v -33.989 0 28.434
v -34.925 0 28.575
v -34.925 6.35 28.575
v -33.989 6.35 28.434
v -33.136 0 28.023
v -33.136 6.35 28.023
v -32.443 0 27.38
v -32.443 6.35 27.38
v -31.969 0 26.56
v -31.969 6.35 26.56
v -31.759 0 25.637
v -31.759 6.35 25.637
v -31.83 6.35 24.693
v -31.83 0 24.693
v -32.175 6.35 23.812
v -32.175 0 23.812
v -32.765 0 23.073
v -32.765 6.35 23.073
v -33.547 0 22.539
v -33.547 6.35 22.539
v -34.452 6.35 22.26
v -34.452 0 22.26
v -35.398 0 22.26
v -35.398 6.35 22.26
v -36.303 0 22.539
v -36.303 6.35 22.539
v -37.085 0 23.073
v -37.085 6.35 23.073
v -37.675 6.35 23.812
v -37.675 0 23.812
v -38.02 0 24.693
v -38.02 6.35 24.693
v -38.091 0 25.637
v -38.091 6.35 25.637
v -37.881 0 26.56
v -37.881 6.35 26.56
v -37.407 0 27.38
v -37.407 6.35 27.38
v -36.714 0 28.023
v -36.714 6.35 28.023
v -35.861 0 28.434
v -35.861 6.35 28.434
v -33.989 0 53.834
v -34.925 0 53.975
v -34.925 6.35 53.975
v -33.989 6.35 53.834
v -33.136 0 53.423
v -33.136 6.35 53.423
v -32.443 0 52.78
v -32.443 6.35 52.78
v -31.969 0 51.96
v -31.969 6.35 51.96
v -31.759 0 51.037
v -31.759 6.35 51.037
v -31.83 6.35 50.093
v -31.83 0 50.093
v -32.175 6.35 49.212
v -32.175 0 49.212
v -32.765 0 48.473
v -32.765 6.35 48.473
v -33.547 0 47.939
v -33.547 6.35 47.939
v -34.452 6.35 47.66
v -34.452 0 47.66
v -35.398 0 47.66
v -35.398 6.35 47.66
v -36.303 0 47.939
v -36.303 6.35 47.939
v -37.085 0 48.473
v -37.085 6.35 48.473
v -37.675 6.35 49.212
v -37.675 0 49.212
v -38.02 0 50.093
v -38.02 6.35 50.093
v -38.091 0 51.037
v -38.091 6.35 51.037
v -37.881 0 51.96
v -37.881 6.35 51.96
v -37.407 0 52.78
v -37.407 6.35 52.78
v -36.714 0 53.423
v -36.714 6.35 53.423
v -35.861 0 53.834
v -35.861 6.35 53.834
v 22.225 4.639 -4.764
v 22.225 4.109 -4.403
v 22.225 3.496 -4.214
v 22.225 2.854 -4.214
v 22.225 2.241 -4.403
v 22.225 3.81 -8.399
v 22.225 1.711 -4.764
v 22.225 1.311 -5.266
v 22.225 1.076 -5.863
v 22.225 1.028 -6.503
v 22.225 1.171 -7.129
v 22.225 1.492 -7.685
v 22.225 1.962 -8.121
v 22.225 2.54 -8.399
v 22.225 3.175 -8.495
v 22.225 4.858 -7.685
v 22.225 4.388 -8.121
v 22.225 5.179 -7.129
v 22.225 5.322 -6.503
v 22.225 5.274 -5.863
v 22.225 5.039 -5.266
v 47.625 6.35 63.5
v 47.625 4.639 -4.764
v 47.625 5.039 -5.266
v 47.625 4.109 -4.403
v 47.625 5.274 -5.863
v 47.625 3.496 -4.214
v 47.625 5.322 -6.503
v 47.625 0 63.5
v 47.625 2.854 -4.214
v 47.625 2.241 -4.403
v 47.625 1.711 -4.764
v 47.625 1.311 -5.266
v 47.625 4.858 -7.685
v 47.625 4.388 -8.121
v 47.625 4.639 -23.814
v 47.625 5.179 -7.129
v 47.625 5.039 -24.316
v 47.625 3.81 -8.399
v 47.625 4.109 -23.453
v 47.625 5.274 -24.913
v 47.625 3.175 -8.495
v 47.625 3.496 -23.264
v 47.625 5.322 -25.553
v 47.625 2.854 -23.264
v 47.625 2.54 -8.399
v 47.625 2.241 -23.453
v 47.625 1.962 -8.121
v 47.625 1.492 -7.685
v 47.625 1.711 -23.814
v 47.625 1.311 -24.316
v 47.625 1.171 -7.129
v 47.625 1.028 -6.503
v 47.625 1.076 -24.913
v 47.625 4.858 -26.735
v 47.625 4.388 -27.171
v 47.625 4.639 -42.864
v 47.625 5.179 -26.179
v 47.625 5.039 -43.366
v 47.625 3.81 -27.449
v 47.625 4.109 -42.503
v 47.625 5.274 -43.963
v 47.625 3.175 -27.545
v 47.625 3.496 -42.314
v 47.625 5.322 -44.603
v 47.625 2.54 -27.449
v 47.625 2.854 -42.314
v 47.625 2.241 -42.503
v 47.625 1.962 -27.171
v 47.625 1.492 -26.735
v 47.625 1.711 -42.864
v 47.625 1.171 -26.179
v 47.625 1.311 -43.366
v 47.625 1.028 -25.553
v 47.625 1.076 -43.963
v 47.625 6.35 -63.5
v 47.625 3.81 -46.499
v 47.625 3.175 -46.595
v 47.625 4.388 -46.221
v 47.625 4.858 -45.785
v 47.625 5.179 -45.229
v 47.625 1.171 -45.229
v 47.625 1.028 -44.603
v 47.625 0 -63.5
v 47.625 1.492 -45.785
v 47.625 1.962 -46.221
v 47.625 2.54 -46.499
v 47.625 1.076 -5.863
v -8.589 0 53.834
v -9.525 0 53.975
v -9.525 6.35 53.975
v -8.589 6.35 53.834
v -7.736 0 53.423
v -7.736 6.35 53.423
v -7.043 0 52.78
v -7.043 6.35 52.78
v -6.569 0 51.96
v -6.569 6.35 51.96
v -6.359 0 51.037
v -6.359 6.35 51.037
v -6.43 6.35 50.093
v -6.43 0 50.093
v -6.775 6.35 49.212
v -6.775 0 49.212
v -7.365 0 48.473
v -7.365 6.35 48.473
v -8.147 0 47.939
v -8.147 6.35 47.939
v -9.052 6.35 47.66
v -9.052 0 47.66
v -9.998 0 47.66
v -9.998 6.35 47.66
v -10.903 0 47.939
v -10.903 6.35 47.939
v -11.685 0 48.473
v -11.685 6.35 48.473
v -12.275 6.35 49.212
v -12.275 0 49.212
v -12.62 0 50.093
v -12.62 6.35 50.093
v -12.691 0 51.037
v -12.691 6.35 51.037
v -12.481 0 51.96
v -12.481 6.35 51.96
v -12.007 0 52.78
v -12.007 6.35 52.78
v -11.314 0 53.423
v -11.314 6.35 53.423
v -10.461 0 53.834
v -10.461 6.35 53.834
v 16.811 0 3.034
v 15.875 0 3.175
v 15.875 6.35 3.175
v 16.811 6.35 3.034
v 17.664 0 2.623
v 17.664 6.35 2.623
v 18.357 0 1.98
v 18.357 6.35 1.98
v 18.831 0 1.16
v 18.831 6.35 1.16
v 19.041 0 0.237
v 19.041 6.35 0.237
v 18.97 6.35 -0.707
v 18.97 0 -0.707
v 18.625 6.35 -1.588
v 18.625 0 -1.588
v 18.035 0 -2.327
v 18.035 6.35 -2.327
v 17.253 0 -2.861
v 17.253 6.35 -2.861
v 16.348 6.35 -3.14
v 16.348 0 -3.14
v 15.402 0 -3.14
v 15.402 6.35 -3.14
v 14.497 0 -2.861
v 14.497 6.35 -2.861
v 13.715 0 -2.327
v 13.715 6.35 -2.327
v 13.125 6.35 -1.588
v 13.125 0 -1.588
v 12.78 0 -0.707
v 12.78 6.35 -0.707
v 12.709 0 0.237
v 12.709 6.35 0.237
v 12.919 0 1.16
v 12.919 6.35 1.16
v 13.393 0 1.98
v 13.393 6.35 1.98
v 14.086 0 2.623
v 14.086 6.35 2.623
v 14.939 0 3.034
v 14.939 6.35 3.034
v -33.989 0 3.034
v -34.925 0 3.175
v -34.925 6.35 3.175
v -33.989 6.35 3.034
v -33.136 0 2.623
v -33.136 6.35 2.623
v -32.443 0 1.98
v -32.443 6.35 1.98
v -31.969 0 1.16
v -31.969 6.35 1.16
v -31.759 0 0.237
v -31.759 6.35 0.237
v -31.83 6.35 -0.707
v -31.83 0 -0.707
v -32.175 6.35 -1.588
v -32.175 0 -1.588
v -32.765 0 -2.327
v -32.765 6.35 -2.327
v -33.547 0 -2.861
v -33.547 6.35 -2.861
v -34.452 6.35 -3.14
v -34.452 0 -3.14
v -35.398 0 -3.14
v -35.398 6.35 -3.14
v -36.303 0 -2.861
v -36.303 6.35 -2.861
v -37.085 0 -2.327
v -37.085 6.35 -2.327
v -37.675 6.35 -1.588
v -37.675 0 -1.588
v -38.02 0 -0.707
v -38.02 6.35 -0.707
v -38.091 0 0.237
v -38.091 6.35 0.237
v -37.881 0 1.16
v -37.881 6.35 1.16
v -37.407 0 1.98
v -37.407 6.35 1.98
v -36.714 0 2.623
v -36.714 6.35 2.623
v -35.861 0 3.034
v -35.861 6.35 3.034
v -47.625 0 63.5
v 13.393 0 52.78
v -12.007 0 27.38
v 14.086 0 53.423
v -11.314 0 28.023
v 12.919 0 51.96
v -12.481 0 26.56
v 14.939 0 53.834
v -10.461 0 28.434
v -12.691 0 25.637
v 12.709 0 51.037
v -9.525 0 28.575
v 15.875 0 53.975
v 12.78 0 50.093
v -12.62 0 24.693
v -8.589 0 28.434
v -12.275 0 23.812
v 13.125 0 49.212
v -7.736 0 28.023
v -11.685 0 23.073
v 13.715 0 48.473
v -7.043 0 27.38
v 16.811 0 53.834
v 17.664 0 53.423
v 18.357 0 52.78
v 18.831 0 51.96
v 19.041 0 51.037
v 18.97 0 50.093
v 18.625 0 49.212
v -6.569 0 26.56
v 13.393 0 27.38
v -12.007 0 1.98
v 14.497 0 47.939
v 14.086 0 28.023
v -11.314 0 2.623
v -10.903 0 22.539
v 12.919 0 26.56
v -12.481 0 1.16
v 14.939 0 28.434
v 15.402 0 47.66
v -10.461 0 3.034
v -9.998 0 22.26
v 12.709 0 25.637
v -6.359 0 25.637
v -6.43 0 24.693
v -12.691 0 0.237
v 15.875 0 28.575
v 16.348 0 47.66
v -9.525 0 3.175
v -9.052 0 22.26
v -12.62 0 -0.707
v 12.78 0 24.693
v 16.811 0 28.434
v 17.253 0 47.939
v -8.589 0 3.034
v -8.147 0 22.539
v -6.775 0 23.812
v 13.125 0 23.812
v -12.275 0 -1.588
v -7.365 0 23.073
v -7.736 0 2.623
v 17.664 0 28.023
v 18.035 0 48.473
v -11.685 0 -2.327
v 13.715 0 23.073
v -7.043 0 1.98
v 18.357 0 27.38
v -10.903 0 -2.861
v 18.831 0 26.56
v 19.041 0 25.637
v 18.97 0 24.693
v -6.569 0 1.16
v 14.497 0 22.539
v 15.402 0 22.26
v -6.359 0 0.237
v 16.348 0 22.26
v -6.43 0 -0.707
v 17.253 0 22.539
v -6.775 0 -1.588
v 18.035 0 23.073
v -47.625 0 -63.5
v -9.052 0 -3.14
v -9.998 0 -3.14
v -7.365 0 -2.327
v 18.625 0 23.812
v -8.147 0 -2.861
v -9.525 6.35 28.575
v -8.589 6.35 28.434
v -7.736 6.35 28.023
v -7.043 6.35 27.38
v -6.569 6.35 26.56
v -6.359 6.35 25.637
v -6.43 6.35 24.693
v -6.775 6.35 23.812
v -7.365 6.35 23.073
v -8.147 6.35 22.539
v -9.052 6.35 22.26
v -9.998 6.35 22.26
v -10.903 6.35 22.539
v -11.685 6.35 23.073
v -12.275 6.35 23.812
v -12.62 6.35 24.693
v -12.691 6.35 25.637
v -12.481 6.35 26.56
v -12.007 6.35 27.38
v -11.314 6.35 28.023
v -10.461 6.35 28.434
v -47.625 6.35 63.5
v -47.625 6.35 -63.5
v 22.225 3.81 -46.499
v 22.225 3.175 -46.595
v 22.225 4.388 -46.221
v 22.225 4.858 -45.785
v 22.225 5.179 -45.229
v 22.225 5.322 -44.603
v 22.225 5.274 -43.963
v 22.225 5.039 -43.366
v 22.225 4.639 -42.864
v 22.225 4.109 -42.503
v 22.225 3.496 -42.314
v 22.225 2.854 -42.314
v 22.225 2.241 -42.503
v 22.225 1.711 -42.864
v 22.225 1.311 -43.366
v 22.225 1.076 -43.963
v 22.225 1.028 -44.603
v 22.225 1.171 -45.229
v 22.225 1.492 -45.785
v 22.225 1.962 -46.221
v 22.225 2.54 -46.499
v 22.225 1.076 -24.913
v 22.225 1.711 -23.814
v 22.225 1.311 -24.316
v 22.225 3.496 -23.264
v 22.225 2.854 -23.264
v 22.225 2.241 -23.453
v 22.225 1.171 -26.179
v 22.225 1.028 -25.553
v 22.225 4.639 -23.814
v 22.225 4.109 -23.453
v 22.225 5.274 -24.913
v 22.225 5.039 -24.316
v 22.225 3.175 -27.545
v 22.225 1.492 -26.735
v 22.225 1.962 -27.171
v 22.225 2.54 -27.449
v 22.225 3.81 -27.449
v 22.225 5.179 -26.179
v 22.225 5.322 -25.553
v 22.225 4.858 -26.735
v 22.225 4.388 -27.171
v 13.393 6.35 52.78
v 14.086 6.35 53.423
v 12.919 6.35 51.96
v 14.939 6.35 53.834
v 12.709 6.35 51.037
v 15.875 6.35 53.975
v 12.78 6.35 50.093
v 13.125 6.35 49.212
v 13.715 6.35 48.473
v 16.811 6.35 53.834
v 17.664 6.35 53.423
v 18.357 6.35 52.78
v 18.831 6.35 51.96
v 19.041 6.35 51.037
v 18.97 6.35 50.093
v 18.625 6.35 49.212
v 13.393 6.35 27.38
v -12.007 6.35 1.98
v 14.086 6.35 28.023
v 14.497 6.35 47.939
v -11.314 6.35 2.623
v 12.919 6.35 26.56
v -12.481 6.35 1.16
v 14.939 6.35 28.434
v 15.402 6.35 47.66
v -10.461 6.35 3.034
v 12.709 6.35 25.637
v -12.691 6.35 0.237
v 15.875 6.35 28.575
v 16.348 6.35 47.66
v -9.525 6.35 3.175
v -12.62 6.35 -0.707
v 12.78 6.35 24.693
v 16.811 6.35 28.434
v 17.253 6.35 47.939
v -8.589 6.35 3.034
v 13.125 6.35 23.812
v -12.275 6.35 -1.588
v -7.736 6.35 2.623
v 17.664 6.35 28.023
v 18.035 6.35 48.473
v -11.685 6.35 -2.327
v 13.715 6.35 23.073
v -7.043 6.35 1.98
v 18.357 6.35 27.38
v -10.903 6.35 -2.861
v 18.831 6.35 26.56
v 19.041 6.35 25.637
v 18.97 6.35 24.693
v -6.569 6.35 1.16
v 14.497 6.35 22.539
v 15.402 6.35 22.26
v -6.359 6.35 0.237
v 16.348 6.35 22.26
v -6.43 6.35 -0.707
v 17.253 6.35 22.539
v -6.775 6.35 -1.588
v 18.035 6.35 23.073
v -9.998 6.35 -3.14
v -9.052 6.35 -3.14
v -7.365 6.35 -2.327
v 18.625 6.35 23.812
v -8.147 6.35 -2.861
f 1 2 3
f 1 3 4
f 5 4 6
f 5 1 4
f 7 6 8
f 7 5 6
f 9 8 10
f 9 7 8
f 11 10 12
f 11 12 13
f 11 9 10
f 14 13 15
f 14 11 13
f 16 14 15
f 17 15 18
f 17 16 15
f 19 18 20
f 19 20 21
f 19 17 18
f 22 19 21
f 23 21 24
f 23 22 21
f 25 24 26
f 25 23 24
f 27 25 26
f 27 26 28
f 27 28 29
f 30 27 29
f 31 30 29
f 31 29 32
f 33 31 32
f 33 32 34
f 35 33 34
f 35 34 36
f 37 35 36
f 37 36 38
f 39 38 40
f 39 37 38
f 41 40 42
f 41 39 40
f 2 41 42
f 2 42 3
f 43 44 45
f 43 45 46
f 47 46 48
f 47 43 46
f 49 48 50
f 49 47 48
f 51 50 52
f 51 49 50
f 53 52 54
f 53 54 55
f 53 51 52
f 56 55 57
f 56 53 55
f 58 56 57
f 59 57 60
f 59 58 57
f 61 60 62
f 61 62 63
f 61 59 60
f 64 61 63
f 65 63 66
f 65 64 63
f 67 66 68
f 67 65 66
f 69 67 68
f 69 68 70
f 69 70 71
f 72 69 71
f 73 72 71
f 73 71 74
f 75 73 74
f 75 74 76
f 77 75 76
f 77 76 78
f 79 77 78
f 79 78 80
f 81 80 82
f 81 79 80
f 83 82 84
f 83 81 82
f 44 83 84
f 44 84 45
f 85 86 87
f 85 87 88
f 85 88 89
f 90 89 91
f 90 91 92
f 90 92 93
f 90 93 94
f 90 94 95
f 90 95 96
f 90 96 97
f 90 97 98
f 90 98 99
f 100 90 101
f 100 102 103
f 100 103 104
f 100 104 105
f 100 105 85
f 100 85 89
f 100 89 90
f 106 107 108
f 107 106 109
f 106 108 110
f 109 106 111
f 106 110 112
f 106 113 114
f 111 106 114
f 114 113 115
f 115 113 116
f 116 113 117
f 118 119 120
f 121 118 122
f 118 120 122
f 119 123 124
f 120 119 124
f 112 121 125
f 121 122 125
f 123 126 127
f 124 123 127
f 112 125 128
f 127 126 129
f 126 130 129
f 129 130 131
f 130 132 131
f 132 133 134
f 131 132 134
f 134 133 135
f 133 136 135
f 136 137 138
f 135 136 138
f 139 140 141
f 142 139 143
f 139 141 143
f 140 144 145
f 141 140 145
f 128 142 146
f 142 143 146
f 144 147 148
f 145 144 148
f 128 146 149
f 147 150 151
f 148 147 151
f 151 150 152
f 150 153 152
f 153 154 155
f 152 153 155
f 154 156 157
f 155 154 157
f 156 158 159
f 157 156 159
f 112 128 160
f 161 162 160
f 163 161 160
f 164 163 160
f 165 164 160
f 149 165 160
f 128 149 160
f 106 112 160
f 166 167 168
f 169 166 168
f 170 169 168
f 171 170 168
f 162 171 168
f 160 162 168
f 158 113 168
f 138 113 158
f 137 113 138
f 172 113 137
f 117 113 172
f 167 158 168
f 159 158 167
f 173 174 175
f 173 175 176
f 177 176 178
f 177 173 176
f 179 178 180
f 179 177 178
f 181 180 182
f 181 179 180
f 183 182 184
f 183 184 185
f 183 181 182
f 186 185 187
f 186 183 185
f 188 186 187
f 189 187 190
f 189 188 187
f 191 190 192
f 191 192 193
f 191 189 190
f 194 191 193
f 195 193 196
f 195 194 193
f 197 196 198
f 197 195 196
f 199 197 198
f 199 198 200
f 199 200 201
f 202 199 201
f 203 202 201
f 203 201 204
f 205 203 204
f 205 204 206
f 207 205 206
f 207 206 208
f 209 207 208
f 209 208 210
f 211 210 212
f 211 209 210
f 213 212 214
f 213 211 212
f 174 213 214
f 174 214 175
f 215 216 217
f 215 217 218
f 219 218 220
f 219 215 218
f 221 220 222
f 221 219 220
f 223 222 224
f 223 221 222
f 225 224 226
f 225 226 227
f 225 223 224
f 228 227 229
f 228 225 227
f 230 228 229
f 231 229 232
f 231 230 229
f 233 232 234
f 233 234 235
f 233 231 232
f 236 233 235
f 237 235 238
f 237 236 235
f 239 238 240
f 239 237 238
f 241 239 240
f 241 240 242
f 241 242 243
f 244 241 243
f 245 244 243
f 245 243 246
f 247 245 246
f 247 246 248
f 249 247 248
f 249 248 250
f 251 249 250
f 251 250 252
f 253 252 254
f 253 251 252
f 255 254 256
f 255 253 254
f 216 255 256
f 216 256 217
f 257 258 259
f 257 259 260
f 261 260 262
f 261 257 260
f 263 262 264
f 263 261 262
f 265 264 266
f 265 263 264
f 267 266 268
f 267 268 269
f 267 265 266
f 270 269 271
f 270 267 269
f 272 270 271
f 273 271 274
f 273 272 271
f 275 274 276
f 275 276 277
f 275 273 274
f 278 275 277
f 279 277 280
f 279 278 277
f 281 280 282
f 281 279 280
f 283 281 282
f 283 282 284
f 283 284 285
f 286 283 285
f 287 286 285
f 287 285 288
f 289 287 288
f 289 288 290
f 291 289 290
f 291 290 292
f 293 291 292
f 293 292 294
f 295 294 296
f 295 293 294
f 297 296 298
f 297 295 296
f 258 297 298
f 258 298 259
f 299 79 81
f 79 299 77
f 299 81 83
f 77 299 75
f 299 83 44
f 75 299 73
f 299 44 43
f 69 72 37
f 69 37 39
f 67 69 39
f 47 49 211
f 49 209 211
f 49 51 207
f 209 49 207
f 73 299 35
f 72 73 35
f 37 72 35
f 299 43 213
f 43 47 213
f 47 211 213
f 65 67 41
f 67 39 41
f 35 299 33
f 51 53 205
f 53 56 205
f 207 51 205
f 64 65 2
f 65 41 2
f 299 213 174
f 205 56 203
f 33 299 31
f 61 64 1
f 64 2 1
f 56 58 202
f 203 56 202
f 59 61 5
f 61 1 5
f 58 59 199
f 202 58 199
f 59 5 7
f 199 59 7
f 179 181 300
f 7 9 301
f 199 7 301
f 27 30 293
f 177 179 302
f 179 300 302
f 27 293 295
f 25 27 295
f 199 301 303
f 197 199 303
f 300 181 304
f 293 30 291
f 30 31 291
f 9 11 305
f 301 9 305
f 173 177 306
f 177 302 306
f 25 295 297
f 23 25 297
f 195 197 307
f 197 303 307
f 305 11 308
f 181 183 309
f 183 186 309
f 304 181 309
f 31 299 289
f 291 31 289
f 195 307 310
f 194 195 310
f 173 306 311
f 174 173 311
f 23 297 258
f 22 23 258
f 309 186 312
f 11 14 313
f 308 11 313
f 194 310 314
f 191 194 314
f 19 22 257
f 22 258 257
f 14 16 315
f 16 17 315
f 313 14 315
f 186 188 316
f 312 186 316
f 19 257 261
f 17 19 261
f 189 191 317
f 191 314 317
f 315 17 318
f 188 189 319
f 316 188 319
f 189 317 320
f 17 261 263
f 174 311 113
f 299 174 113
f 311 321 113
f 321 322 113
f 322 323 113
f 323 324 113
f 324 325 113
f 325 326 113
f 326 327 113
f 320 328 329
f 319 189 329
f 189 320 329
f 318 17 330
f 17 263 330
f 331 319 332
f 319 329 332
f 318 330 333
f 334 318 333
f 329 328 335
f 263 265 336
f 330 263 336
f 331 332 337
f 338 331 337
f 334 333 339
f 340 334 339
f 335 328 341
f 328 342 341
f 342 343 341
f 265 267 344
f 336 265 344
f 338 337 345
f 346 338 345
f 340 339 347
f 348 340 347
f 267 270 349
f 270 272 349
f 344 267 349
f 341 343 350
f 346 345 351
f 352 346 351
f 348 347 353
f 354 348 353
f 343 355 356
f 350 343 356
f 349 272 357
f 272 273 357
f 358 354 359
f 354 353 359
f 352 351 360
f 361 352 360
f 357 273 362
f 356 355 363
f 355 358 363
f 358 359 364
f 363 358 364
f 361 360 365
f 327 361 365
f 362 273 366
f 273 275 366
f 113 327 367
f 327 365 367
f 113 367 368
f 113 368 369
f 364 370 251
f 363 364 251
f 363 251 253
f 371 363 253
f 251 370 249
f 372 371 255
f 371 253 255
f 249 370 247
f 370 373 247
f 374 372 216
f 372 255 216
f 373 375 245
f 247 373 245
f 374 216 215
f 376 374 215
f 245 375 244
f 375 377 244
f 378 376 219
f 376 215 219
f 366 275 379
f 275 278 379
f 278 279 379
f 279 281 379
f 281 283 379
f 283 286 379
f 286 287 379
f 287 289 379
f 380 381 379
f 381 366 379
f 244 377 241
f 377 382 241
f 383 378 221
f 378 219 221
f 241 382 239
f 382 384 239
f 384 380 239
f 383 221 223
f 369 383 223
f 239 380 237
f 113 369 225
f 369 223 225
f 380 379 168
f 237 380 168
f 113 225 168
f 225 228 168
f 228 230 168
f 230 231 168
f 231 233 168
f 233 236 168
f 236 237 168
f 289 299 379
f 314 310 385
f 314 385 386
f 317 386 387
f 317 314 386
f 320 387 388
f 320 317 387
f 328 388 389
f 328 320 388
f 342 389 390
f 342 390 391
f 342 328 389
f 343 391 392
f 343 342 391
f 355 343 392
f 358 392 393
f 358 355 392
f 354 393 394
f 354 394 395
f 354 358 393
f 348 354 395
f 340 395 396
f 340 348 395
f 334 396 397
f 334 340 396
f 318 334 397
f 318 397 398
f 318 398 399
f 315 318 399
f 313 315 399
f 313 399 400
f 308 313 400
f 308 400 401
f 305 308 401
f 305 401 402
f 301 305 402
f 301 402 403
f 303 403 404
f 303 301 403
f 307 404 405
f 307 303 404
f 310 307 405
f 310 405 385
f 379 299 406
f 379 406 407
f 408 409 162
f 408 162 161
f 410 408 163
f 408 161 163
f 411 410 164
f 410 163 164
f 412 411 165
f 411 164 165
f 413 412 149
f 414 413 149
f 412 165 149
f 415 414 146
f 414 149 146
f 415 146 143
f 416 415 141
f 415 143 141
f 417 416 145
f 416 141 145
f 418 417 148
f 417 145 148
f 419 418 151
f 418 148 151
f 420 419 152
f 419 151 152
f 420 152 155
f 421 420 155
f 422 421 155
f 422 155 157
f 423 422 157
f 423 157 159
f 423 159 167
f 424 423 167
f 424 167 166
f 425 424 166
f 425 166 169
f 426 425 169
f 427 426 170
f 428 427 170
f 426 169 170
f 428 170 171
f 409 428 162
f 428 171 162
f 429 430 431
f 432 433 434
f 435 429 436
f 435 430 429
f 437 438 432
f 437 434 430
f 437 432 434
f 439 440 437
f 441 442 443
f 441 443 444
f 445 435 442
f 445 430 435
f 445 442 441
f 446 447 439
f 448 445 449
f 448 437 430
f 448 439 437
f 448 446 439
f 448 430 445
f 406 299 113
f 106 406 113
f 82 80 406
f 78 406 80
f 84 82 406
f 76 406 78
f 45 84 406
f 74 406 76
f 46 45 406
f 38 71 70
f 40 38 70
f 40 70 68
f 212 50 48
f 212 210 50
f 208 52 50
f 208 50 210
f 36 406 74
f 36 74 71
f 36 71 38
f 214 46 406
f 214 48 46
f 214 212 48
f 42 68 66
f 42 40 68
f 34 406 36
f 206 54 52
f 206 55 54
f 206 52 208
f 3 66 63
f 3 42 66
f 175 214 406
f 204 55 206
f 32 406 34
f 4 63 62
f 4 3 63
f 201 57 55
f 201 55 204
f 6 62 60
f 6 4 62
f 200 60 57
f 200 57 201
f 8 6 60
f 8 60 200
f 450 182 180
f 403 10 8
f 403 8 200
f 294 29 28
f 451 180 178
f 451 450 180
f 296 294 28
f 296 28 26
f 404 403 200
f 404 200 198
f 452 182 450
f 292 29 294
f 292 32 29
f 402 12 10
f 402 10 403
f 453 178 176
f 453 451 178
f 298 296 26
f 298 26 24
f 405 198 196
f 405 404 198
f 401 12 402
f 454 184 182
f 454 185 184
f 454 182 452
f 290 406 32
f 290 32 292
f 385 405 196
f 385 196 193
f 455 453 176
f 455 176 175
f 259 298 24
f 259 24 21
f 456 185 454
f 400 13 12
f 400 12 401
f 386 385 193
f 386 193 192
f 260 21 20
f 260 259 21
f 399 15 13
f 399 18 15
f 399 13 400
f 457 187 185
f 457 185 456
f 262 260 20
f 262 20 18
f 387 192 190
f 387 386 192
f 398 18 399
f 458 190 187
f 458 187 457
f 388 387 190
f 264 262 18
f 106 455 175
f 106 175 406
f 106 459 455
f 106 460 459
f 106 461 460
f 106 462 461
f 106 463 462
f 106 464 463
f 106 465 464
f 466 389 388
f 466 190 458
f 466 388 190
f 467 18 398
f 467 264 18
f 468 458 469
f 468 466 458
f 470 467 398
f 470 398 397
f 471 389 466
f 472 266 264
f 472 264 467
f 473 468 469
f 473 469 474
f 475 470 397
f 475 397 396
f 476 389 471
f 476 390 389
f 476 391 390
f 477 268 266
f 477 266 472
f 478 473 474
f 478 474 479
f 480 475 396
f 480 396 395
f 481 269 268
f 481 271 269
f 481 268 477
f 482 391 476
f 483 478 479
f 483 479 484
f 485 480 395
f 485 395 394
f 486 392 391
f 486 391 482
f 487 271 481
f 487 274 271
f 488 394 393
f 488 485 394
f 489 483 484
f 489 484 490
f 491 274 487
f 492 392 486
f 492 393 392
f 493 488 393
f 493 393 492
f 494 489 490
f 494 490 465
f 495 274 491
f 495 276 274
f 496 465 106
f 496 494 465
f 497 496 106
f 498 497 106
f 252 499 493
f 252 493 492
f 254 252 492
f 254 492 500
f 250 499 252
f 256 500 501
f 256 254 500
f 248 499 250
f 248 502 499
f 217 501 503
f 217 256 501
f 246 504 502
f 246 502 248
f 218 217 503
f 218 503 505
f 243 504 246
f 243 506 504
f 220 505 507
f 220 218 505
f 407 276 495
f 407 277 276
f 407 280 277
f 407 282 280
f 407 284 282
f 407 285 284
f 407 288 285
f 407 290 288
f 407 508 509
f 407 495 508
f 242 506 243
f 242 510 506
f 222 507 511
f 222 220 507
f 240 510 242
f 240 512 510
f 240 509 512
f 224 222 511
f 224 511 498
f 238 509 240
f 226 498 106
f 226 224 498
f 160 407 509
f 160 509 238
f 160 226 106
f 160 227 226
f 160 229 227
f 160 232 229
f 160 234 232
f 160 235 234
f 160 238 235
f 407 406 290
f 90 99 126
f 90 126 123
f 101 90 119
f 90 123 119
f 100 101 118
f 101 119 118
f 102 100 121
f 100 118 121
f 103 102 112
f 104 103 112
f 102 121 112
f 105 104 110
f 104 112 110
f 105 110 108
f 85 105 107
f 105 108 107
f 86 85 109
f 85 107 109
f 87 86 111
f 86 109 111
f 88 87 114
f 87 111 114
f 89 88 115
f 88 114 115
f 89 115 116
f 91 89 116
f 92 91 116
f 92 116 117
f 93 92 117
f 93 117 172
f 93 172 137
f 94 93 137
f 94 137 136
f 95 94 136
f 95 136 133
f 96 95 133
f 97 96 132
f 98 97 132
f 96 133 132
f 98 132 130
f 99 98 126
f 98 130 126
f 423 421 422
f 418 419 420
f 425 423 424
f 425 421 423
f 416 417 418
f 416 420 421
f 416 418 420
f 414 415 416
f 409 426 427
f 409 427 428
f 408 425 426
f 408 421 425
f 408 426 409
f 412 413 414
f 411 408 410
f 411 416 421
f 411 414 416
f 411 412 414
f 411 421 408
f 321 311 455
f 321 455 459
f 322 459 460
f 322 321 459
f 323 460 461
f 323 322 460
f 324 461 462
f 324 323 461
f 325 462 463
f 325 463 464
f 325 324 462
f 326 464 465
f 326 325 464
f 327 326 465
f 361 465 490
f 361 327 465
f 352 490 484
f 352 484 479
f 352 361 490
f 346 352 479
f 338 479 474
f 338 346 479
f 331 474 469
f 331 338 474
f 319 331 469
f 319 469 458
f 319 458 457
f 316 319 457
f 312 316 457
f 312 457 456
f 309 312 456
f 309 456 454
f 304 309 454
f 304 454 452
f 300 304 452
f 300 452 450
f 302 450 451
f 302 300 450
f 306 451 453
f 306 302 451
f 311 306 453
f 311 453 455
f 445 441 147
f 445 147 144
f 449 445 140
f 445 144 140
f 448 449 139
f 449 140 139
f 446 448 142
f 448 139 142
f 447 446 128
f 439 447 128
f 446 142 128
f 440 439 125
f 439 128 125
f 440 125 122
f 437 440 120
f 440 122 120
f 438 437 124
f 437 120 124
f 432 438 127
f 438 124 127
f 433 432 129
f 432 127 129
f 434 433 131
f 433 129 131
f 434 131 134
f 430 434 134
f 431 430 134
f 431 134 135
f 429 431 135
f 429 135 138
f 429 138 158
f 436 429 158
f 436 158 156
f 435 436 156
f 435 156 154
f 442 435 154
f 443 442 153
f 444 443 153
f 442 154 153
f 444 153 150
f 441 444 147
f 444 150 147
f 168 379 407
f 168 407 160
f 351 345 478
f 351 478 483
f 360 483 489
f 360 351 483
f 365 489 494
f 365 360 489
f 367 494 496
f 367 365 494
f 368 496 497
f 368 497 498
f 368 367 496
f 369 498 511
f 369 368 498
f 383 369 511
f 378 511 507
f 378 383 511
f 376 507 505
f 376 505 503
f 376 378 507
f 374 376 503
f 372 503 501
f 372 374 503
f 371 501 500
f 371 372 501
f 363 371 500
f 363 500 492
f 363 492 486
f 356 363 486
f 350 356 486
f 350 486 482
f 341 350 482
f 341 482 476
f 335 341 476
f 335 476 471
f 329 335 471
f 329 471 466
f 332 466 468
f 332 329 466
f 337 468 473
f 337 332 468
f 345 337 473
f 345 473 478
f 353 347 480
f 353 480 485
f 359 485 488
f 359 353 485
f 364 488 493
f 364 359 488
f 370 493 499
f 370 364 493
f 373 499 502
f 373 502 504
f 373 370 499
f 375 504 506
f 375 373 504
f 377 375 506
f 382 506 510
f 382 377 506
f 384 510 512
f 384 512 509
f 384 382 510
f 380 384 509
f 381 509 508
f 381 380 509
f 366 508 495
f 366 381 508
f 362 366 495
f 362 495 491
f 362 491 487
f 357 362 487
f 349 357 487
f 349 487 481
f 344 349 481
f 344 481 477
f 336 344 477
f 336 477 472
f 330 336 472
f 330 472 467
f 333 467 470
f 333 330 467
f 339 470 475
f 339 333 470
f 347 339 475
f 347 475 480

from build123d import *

# Parameters (mm, degrees)
SKETCH1_W           = 95.25
SKETCH1_H           = 127
SKETCH1_R           = 3.175
BOSS_EXTRUDE1_DEPTH = 6.35
SKETCH2_R           = 2.15265
CUT_EXTRUDE1_DEPTH  = 25.4


with BuildPart() as part:
    # Sketch1 → Boss-Extrude1 (new body)
    with BuildSketch(Plane(origin=(0, 0, 0), x_dir=(1, 0, 0), z_dir=(0, 1, 0))):
        Rectangle(SKETCH1_W, SKETCH1_H)
        with Locations(Location((-34.925, 0, 0), (0, 0, 270))):
            Circle(SKETCH1_R, mode=Mode.SUBTRACT)
        with Locations(Location((-9.525, 0, 0), (0, 0, 270))):
            Circle(SKETCH1_R, mode=Mode.SUBTRACT)
        with Locations(Location((15.875, 0, 0), (0, 0, 270))):
            Circle(SKETCH1_R, mode=Mode.SUBTRACT)
        with Locations(Location((-9.525, -25.4, 0), (0, 0, 270))):
            Circle(SKETCH1_R, mode=Mode.SUBTRACT)
        with Locations(Location((15.875, -25.4, 0), (0, 0, 270))):
            Circle(SKETCH1_R, mode=Mode.SUBTRACT)
        with Locations(Location((-9.525, -50.8, 0), (0, 0, 270))):
            Circle(SKETCH1_R, mode=Mode.SUBTRACT)
        with Locations(Location((15.875, -50.8, 0), (0, 0, 270))):
            Circle(SKETCH1_R, mode=Mode.SUBTRACT)
        with Locations(Location((-34.925, -25.4, 0), (0, 0, 270))):
            Circle(SKETCH1_R, mode=Mode.SUBTRACT)
        with Locations(Location((-34.925, -50.8, 0), (0, 0, 270))):
            Circle(SKETCH1_R, mode=Mode.SUBTRACT)
    extrude(amount=BOSS_EXTRUDE1_DEPTH)

    # Sketch2 → Cut-Extrude1 (cut)
    with BuildSketch(Plane(origin=(47.625, 0, 0), x_dir=(0, 0, -1), z_dir=(1, 0, 0))):
        with Locations((44.44238, 3.175)):
            Circle(SKETCH2_R)
        with Locations((25.39238, 3.175)):
            Circle(SKETCH2_R)
        with Locations((6.34238, 3.175)):
            Circle(SKETCH2_R)
    extrude(amount=-CUT_EXTRUDE1_DEPTH, mode=Mode.SUBTRACT)


solid = part.part
